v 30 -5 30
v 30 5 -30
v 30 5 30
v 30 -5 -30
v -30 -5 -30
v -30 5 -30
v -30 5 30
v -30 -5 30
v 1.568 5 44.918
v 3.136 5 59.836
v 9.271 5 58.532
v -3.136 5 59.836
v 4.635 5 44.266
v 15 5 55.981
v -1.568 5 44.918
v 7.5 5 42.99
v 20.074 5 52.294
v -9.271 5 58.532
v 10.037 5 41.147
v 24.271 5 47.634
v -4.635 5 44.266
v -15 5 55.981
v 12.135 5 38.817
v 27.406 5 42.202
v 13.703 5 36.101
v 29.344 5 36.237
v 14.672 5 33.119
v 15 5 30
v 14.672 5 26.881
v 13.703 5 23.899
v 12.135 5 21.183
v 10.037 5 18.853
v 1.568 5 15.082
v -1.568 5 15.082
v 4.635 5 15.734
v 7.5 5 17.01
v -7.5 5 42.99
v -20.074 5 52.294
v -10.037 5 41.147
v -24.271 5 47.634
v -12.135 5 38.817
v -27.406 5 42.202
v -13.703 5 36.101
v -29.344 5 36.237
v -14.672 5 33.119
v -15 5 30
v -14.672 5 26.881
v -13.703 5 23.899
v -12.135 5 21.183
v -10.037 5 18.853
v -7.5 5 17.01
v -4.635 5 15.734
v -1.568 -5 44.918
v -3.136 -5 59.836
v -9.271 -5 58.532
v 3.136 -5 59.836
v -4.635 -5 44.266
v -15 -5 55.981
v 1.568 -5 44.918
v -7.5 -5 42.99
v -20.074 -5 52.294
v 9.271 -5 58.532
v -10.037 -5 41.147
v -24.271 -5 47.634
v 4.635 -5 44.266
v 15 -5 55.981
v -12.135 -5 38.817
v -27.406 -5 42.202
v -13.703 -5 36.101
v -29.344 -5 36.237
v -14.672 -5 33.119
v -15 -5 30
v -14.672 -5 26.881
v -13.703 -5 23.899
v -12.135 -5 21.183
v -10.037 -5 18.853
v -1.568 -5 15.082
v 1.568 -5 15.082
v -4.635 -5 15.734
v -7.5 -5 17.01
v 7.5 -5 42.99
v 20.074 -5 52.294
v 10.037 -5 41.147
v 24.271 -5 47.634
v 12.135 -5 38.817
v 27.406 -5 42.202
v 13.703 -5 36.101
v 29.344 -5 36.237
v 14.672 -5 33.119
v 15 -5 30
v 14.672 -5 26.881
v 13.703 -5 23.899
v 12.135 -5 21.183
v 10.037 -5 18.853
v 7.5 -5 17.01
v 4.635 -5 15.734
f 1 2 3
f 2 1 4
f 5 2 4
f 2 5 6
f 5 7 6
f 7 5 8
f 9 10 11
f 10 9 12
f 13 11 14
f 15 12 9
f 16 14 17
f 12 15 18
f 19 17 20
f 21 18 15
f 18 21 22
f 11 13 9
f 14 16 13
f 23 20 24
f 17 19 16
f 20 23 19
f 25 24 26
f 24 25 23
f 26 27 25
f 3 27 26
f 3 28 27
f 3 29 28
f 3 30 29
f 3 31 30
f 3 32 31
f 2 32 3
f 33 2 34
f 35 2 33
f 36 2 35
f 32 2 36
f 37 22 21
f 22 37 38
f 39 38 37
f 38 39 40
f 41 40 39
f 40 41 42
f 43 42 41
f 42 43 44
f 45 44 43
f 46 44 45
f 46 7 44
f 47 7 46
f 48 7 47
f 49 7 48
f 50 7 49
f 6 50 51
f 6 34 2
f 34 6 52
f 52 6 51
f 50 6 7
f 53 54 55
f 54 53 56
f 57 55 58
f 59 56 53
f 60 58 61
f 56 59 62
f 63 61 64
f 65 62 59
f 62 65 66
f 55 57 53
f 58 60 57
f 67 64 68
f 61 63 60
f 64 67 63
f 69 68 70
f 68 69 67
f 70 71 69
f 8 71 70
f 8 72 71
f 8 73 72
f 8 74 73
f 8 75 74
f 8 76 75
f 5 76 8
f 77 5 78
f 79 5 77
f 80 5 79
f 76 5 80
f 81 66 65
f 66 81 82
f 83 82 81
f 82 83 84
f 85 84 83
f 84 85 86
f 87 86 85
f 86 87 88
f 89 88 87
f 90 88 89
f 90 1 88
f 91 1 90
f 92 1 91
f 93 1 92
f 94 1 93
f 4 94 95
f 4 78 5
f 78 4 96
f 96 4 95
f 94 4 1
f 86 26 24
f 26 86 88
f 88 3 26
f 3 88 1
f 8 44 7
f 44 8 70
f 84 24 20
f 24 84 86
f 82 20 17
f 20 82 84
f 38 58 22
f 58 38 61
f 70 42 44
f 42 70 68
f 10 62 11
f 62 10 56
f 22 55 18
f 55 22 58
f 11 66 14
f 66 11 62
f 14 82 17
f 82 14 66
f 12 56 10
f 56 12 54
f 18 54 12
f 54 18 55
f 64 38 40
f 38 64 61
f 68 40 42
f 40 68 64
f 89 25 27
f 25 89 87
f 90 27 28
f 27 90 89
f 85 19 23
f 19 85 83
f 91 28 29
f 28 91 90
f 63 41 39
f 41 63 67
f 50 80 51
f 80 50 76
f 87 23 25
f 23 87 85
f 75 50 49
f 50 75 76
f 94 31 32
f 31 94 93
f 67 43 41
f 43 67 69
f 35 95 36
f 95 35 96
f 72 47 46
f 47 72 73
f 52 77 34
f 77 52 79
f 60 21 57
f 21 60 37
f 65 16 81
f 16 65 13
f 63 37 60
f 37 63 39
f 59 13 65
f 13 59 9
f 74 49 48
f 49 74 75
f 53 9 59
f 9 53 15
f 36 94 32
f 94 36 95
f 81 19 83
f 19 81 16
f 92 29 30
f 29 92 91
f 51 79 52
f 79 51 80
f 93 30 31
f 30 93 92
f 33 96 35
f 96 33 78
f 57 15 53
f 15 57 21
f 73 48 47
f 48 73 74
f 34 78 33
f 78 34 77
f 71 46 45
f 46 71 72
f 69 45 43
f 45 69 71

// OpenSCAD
module Eyebolt(){

    module pieno(){
        cube([60,10,60], center =true);

        translate([0,0,30])
        rotate([90,0,0])
        cylinder(10,30,30,$fn=30,center=true);
    }

    color("#a8b0b2")
    difference(){

    pieno();

    translate([0,0,30])
    rotate([90,0,0])
    cylinder(12,15,15,$fn=30,center=true);
    }

}

Eyebolt();

// Written by Nicolì Angelo (Gengio) 2024: 
// MIT License

//Permission is hereby granted, free of charge, to any person obtaining a copy of this software and associated documentation files (the "Software"), to deal in the Software without restriction, including without limitation the rights to use, copy, modify, merge, publish, distribute, sublicense, and/or sell copies of the Software, and to permit persons to whom the Software is furnished to do so, subject to the following conditions:

//The above copyright notice and this permission notice shall be included in all copies or substantial portions of the Software.

//THE SOFTWARE IS PROVIDED "AS IS", WITHOUT WARRANTY OF ANY KIND, EXPRESS OR IMPLIED, INCLUDING BUT NOT LIMITED TO THE WARRANTIES OF MERCHANTABILITY, FITNESS FOR A PARTICULAR PURPOSE AND NONINFRINGEMENT. IN NO EVENT SHALL THE AUTHORS OR COPYRIGHT HOLDERS BE LIABLE FOR ANY CLAIM, DAMAGES OR OTHER LIABILITY, WHETHER IN AN ACTION OF CONTRACT, TORT OR OTHERWISE, ARISING FROM, OUT OF OR IN CONNECTION WITH THE SOFTWARE OR THE USE OR OTHER DEALINGS IN THE SOFTWARE.
